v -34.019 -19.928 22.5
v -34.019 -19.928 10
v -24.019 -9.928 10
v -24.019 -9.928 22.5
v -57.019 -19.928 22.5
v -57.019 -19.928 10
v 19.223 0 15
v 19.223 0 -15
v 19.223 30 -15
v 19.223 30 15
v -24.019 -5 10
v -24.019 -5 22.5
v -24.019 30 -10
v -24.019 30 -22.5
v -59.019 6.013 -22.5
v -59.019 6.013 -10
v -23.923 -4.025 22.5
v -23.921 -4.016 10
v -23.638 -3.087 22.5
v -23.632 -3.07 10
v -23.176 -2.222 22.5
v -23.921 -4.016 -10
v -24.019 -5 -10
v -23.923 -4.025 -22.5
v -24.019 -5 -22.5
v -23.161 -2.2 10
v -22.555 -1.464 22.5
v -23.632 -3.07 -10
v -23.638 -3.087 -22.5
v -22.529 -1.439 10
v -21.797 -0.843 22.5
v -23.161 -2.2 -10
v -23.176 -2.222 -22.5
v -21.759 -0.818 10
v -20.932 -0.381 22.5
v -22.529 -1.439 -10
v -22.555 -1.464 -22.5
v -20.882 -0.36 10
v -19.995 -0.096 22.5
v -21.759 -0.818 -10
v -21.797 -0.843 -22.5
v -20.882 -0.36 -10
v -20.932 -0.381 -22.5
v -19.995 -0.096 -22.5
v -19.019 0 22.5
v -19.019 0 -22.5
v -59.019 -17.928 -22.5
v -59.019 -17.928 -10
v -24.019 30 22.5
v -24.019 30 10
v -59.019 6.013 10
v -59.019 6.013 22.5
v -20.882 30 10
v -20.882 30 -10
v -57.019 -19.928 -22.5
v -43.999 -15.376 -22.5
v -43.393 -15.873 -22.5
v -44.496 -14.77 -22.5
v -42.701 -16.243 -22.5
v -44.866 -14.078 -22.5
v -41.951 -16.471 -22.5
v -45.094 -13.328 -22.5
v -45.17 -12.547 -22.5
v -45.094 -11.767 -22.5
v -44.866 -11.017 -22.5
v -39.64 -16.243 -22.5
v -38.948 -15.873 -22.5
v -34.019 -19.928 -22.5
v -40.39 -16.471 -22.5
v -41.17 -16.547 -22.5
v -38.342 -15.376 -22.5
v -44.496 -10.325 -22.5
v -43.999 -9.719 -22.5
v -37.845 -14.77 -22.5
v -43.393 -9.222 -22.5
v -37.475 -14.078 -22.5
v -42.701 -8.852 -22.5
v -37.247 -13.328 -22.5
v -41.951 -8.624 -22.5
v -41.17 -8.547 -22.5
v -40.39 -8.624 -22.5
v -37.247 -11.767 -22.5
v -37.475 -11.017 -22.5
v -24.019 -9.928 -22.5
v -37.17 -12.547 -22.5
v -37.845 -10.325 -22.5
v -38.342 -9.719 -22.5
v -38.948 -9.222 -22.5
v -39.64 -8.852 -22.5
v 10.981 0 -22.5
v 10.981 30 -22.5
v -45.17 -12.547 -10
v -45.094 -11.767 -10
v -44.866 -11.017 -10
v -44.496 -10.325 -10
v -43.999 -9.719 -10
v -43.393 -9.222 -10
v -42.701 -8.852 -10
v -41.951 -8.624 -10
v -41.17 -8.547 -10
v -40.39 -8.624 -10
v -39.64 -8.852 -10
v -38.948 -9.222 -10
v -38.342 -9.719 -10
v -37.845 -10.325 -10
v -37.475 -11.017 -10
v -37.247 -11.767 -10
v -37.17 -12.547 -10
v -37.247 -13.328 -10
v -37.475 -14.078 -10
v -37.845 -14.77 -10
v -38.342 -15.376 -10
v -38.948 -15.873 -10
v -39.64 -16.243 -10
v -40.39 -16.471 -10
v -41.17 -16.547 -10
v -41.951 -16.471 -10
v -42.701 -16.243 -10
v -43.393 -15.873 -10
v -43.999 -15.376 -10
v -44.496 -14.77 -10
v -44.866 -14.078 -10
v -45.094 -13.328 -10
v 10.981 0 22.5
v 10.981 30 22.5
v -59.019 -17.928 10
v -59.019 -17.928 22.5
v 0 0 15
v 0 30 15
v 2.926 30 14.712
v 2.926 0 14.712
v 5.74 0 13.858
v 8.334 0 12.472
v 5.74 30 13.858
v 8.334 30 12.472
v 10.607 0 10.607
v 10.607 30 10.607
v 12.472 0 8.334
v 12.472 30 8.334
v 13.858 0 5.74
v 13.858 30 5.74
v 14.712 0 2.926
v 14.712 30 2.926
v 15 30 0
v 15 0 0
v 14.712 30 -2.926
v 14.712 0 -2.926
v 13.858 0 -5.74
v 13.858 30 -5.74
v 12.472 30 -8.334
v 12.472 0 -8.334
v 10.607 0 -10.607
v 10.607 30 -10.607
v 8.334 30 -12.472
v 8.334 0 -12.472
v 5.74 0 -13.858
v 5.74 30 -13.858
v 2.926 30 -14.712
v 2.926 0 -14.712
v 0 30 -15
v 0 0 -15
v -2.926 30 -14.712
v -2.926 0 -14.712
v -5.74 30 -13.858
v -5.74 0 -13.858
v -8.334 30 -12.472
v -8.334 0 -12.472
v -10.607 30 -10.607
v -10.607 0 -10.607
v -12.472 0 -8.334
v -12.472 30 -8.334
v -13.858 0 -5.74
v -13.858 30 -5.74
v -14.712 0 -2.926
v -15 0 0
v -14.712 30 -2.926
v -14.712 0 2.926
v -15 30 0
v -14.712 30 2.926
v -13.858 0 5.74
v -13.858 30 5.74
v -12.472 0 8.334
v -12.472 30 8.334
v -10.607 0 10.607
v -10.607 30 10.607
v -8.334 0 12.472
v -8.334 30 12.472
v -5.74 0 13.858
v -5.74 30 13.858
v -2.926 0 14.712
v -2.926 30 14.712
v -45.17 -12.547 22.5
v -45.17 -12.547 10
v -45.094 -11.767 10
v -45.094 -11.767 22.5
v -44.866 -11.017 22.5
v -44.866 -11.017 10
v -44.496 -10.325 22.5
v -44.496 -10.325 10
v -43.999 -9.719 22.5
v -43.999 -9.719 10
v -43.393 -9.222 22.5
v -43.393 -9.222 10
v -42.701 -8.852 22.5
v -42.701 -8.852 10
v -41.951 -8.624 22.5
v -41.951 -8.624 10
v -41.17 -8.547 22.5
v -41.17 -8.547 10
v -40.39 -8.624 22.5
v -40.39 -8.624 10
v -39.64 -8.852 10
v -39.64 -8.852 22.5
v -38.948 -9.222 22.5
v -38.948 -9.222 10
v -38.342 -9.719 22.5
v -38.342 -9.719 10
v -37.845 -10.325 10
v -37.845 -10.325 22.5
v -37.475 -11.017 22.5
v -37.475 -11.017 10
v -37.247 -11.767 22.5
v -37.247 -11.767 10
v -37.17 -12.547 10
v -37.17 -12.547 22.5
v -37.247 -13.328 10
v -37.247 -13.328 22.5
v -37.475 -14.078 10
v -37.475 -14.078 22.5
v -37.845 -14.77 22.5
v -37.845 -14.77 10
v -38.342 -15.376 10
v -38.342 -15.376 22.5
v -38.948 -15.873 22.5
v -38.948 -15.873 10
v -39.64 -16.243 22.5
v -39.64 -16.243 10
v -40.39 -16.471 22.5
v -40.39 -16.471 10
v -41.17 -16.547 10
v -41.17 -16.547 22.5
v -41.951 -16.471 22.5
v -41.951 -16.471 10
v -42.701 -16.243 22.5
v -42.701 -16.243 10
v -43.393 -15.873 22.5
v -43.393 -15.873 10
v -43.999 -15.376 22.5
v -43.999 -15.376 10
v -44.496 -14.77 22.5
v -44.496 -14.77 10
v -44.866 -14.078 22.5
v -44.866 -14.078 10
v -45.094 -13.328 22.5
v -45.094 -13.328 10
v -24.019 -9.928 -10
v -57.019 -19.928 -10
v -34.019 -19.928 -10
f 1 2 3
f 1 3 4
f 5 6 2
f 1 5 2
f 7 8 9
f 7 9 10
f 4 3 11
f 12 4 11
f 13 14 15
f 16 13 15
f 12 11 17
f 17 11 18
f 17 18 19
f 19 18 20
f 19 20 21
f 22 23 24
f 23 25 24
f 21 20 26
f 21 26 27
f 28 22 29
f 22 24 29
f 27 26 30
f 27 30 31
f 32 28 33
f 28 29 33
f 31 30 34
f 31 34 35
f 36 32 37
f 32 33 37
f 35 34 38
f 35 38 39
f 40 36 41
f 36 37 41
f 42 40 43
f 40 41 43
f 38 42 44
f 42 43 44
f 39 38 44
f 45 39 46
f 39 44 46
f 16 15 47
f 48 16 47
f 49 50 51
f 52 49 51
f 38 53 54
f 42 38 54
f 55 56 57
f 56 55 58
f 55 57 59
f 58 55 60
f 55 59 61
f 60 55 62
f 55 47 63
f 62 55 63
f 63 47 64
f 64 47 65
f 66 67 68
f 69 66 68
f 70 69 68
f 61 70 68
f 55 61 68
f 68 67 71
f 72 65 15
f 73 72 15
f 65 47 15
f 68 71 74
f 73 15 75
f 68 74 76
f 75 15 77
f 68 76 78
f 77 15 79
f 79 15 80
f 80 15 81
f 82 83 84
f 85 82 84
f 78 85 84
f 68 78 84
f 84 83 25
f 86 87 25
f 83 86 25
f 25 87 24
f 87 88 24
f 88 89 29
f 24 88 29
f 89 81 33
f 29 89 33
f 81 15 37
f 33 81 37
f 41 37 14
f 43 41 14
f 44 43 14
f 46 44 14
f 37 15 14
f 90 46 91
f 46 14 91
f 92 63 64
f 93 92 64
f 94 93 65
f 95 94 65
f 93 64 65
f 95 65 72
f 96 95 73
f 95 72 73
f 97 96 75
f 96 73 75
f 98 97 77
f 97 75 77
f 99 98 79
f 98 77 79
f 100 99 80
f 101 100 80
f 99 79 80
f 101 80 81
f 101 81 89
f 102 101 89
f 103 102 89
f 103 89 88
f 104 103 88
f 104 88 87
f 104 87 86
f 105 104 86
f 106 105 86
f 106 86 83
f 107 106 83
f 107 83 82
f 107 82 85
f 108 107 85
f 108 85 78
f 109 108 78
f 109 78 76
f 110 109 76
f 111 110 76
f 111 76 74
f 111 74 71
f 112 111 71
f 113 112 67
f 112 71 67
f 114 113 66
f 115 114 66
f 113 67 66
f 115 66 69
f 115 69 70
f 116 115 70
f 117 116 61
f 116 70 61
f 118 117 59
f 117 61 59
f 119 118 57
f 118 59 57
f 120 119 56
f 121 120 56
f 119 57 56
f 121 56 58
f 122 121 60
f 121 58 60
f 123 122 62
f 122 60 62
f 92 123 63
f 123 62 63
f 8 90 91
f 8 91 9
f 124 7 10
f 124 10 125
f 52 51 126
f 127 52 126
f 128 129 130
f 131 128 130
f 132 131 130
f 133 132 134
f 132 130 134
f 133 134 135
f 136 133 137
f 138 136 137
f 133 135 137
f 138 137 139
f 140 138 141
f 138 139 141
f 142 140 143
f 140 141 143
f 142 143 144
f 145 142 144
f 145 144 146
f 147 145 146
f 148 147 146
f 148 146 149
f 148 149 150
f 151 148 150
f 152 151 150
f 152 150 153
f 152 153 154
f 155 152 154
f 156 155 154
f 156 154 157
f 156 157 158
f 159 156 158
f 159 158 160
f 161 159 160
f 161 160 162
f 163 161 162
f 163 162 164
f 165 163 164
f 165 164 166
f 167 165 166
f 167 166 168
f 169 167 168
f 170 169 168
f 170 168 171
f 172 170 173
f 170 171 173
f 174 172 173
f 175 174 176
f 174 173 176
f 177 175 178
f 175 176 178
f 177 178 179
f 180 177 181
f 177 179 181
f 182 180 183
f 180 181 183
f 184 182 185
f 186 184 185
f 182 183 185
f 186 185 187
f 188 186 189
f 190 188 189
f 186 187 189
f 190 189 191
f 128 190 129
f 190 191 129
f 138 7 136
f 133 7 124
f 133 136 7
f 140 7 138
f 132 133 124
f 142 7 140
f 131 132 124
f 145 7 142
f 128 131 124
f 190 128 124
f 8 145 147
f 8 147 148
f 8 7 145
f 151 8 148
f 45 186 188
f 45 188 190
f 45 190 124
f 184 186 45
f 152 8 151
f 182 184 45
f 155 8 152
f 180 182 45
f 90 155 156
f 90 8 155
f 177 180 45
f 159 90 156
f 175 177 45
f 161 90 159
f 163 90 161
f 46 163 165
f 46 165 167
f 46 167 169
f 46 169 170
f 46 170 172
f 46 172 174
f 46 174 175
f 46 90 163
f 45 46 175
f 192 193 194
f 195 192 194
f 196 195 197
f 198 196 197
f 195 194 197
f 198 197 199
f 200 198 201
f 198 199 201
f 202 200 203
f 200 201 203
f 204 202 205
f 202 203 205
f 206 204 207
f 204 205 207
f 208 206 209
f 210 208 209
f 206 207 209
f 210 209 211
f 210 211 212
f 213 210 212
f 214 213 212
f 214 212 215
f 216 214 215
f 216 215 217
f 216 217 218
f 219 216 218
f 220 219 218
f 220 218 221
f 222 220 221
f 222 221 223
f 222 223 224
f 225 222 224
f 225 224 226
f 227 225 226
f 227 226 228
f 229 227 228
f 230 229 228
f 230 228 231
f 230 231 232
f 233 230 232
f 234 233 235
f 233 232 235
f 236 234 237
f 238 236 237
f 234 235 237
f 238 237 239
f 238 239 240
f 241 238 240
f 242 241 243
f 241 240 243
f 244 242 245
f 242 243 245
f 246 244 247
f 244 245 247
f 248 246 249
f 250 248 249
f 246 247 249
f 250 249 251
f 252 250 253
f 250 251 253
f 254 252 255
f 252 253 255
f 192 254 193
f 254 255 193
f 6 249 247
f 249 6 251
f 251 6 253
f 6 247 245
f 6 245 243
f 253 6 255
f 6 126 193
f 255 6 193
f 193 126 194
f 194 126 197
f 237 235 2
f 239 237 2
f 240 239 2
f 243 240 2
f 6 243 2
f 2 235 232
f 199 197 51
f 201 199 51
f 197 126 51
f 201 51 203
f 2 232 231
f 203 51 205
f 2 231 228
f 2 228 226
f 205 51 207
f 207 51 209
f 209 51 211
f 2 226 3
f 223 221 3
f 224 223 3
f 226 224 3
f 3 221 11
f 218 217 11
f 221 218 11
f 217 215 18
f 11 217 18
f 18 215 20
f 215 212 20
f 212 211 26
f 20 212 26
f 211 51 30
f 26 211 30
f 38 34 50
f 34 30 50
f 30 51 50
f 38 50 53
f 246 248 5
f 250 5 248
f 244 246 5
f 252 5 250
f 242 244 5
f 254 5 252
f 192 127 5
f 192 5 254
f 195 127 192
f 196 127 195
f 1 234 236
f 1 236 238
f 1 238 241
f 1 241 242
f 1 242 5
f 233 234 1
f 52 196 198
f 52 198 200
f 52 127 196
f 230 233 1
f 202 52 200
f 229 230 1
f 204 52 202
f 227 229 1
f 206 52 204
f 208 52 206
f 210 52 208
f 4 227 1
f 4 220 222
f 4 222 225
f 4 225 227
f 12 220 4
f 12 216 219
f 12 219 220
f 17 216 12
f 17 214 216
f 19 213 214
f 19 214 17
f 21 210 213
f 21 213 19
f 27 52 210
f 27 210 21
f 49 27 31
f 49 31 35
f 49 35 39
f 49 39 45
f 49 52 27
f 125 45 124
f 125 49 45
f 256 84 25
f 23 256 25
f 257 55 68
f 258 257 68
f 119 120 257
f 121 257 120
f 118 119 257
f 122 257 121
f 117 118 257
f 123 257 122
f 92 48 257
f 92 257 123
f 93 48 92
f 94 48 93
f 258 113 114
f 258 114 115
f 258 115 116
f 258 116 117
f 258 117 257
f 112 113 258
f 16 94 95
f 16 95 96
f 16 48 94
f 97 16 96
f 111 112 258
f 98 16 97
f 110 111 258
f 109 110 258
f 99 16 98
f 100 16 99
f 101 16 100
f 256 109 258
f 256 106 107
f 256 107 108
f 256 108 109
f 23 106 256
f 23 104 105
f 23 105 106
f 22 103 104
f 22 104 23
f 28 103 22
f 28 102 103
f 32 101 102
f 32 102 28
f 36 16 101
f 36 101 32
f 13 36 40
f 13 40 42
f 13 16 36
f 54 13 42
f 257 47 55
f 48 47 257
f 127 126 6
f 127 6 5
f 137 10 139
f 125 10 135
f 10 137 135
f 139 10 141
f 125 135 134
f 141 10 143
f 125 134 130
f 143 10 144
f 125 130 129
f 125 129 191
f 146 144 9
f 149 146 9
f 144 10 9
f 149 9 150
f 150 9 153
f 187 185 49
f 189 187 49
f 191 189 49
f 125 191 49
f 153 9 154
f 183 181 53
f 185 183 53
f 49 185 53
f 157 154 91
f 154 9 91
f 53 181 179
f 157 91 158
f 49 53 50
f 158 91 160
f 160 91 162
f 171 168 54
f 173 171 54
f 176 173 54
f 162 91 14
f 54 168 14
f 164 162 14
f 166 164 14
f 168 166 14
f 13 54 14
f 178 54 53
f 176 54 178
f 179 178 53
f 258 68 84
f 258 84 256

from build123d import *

# Parameters (mm, degrees)
EXTRUDE_1_DEPTH       = 30
SKETCH_2_R            = 15
CUT_EXTRUDE_2_DEPTH   = 45.532745299
EXTRUDE_3_DEPTH       = 45
CUT_EXTRUDE_START     = 70
SKETCH_3_W            = 44.656689001
SKETCH_3_H            = 20
CUT_EXTRUDE_1_DEPTH   = 130
SKETCH_7_R            = 3.999999997
CUT_EXTRUDE_2_2_DEPTH = 81.051544881
FILLET_1_R            = 5
CHAMFER_5_SIZE        = 2
CHAMFER_6_SIZE        = 10


with BuildPart() as part:
    # Эскиз1 → Вытянуть1 (new body)
    with BuildSketch(Plane(origin=(0, 0, 0), x_dir=(1, 0, 0), z_dir=(0, 1, 0))):
        Polygon((-24.019063342, 22.5), (10.980936658, 22.5), (19.22346273, 15), (19.22346273, -15), (10.980936658, -22.5), (-24.019063342, -22.5), align=None)
    extrude(amount=EXTRUDE_1_DEPTH)

    # Эскиз2 → Cut-Extrude 2 (cut, through all)
    with BuildSketch(Plane(origin=(0, 30, 0), x_dir=(1, 0, 0), z_dir=(0, 1, 0))):
        with Locations(Location((0, 0, 0), (0, 0, 270))):
            Circle(SKETCH_2_R)
    extrude(amount=-CUT_EXTRUDE_2_DEPTH, mode=Mode.SUBTRACT)

    # Эскиз6 → Вытянуть3 (add)
    with BuildSketch(Plane(origin=(0, 0, -22.5), x_dir=(-1, 0, 0), z_dir=(0, 0, -1))):
        Polygon((24.019063342, -19.927530698), (24.019063342, 30), (59.019063342, 6.012561534), (59.019063342, -19.927530698), align=None)
    extrude(amount=-EXTRUDE_3_DEPTH)

    # Эскиз3 → Вырез-Вытянуть1 (cut)
    with BuildSketch(Plane(origin=(0, 30, 0), x_dir=(1, 0, 0), z_dir=(0, 1, 0)).offset(CUT_EXTRUDE_START)):
        with Locations((-43.210774099, 0)):
            Rectangle(SKETCH_3_W, SKETCH_3_H)
    extrude(amount=-CUT_EXTRUDE_1_DEPTH, mode=Mode.SUBTRACT)

    # Эскиз7 → Cut-Extrude 2 2 (cut, through all)
    with BuildSketch(Plane(origin=(0, 0, -22.5), x_dir=(-1, 0, 0), z_dir=(0, 0, -1))):
        with Locations((41.170494395, -12.547441244)):
            Circle(SKETCH_7_R)
    extrude(amount=-CUT_EXTRUDE_2_2_DEPTH, mode=Mode.SUBTRACT)

    # Скругление1
    fillet_1_edges = [part.edges().sort_by_distance(p)[0] for p in [
        (-24.019063342, 0, -16.25),
    ]]
    fillet(fillet_1_edges, radius=FILLET_1_R)

    # Фаска5
    chamfer_5_edges = [part.edges().sort_by_distance(p)[0] for p in [
        (-59.019063342, -19.927530698, 16.25),
        (-59.019063342, -19.927530698, -16.25),
    ]]
    chamfer(chamfer_5_edges, length=CHAMFER_5_SIZE)

    # Фаска6
    chamfer_6_edges = [part.edges().sort_by_distance(p)[0] for p in [
        (-24.019063342, -19.927530698, 16.25),
        (-24.019063342, -19.927530698, -16.25),
    ]]
    chamfer(chamfer_6_edges, length=CHAMFER_6_SIZE)


solid = part.part
